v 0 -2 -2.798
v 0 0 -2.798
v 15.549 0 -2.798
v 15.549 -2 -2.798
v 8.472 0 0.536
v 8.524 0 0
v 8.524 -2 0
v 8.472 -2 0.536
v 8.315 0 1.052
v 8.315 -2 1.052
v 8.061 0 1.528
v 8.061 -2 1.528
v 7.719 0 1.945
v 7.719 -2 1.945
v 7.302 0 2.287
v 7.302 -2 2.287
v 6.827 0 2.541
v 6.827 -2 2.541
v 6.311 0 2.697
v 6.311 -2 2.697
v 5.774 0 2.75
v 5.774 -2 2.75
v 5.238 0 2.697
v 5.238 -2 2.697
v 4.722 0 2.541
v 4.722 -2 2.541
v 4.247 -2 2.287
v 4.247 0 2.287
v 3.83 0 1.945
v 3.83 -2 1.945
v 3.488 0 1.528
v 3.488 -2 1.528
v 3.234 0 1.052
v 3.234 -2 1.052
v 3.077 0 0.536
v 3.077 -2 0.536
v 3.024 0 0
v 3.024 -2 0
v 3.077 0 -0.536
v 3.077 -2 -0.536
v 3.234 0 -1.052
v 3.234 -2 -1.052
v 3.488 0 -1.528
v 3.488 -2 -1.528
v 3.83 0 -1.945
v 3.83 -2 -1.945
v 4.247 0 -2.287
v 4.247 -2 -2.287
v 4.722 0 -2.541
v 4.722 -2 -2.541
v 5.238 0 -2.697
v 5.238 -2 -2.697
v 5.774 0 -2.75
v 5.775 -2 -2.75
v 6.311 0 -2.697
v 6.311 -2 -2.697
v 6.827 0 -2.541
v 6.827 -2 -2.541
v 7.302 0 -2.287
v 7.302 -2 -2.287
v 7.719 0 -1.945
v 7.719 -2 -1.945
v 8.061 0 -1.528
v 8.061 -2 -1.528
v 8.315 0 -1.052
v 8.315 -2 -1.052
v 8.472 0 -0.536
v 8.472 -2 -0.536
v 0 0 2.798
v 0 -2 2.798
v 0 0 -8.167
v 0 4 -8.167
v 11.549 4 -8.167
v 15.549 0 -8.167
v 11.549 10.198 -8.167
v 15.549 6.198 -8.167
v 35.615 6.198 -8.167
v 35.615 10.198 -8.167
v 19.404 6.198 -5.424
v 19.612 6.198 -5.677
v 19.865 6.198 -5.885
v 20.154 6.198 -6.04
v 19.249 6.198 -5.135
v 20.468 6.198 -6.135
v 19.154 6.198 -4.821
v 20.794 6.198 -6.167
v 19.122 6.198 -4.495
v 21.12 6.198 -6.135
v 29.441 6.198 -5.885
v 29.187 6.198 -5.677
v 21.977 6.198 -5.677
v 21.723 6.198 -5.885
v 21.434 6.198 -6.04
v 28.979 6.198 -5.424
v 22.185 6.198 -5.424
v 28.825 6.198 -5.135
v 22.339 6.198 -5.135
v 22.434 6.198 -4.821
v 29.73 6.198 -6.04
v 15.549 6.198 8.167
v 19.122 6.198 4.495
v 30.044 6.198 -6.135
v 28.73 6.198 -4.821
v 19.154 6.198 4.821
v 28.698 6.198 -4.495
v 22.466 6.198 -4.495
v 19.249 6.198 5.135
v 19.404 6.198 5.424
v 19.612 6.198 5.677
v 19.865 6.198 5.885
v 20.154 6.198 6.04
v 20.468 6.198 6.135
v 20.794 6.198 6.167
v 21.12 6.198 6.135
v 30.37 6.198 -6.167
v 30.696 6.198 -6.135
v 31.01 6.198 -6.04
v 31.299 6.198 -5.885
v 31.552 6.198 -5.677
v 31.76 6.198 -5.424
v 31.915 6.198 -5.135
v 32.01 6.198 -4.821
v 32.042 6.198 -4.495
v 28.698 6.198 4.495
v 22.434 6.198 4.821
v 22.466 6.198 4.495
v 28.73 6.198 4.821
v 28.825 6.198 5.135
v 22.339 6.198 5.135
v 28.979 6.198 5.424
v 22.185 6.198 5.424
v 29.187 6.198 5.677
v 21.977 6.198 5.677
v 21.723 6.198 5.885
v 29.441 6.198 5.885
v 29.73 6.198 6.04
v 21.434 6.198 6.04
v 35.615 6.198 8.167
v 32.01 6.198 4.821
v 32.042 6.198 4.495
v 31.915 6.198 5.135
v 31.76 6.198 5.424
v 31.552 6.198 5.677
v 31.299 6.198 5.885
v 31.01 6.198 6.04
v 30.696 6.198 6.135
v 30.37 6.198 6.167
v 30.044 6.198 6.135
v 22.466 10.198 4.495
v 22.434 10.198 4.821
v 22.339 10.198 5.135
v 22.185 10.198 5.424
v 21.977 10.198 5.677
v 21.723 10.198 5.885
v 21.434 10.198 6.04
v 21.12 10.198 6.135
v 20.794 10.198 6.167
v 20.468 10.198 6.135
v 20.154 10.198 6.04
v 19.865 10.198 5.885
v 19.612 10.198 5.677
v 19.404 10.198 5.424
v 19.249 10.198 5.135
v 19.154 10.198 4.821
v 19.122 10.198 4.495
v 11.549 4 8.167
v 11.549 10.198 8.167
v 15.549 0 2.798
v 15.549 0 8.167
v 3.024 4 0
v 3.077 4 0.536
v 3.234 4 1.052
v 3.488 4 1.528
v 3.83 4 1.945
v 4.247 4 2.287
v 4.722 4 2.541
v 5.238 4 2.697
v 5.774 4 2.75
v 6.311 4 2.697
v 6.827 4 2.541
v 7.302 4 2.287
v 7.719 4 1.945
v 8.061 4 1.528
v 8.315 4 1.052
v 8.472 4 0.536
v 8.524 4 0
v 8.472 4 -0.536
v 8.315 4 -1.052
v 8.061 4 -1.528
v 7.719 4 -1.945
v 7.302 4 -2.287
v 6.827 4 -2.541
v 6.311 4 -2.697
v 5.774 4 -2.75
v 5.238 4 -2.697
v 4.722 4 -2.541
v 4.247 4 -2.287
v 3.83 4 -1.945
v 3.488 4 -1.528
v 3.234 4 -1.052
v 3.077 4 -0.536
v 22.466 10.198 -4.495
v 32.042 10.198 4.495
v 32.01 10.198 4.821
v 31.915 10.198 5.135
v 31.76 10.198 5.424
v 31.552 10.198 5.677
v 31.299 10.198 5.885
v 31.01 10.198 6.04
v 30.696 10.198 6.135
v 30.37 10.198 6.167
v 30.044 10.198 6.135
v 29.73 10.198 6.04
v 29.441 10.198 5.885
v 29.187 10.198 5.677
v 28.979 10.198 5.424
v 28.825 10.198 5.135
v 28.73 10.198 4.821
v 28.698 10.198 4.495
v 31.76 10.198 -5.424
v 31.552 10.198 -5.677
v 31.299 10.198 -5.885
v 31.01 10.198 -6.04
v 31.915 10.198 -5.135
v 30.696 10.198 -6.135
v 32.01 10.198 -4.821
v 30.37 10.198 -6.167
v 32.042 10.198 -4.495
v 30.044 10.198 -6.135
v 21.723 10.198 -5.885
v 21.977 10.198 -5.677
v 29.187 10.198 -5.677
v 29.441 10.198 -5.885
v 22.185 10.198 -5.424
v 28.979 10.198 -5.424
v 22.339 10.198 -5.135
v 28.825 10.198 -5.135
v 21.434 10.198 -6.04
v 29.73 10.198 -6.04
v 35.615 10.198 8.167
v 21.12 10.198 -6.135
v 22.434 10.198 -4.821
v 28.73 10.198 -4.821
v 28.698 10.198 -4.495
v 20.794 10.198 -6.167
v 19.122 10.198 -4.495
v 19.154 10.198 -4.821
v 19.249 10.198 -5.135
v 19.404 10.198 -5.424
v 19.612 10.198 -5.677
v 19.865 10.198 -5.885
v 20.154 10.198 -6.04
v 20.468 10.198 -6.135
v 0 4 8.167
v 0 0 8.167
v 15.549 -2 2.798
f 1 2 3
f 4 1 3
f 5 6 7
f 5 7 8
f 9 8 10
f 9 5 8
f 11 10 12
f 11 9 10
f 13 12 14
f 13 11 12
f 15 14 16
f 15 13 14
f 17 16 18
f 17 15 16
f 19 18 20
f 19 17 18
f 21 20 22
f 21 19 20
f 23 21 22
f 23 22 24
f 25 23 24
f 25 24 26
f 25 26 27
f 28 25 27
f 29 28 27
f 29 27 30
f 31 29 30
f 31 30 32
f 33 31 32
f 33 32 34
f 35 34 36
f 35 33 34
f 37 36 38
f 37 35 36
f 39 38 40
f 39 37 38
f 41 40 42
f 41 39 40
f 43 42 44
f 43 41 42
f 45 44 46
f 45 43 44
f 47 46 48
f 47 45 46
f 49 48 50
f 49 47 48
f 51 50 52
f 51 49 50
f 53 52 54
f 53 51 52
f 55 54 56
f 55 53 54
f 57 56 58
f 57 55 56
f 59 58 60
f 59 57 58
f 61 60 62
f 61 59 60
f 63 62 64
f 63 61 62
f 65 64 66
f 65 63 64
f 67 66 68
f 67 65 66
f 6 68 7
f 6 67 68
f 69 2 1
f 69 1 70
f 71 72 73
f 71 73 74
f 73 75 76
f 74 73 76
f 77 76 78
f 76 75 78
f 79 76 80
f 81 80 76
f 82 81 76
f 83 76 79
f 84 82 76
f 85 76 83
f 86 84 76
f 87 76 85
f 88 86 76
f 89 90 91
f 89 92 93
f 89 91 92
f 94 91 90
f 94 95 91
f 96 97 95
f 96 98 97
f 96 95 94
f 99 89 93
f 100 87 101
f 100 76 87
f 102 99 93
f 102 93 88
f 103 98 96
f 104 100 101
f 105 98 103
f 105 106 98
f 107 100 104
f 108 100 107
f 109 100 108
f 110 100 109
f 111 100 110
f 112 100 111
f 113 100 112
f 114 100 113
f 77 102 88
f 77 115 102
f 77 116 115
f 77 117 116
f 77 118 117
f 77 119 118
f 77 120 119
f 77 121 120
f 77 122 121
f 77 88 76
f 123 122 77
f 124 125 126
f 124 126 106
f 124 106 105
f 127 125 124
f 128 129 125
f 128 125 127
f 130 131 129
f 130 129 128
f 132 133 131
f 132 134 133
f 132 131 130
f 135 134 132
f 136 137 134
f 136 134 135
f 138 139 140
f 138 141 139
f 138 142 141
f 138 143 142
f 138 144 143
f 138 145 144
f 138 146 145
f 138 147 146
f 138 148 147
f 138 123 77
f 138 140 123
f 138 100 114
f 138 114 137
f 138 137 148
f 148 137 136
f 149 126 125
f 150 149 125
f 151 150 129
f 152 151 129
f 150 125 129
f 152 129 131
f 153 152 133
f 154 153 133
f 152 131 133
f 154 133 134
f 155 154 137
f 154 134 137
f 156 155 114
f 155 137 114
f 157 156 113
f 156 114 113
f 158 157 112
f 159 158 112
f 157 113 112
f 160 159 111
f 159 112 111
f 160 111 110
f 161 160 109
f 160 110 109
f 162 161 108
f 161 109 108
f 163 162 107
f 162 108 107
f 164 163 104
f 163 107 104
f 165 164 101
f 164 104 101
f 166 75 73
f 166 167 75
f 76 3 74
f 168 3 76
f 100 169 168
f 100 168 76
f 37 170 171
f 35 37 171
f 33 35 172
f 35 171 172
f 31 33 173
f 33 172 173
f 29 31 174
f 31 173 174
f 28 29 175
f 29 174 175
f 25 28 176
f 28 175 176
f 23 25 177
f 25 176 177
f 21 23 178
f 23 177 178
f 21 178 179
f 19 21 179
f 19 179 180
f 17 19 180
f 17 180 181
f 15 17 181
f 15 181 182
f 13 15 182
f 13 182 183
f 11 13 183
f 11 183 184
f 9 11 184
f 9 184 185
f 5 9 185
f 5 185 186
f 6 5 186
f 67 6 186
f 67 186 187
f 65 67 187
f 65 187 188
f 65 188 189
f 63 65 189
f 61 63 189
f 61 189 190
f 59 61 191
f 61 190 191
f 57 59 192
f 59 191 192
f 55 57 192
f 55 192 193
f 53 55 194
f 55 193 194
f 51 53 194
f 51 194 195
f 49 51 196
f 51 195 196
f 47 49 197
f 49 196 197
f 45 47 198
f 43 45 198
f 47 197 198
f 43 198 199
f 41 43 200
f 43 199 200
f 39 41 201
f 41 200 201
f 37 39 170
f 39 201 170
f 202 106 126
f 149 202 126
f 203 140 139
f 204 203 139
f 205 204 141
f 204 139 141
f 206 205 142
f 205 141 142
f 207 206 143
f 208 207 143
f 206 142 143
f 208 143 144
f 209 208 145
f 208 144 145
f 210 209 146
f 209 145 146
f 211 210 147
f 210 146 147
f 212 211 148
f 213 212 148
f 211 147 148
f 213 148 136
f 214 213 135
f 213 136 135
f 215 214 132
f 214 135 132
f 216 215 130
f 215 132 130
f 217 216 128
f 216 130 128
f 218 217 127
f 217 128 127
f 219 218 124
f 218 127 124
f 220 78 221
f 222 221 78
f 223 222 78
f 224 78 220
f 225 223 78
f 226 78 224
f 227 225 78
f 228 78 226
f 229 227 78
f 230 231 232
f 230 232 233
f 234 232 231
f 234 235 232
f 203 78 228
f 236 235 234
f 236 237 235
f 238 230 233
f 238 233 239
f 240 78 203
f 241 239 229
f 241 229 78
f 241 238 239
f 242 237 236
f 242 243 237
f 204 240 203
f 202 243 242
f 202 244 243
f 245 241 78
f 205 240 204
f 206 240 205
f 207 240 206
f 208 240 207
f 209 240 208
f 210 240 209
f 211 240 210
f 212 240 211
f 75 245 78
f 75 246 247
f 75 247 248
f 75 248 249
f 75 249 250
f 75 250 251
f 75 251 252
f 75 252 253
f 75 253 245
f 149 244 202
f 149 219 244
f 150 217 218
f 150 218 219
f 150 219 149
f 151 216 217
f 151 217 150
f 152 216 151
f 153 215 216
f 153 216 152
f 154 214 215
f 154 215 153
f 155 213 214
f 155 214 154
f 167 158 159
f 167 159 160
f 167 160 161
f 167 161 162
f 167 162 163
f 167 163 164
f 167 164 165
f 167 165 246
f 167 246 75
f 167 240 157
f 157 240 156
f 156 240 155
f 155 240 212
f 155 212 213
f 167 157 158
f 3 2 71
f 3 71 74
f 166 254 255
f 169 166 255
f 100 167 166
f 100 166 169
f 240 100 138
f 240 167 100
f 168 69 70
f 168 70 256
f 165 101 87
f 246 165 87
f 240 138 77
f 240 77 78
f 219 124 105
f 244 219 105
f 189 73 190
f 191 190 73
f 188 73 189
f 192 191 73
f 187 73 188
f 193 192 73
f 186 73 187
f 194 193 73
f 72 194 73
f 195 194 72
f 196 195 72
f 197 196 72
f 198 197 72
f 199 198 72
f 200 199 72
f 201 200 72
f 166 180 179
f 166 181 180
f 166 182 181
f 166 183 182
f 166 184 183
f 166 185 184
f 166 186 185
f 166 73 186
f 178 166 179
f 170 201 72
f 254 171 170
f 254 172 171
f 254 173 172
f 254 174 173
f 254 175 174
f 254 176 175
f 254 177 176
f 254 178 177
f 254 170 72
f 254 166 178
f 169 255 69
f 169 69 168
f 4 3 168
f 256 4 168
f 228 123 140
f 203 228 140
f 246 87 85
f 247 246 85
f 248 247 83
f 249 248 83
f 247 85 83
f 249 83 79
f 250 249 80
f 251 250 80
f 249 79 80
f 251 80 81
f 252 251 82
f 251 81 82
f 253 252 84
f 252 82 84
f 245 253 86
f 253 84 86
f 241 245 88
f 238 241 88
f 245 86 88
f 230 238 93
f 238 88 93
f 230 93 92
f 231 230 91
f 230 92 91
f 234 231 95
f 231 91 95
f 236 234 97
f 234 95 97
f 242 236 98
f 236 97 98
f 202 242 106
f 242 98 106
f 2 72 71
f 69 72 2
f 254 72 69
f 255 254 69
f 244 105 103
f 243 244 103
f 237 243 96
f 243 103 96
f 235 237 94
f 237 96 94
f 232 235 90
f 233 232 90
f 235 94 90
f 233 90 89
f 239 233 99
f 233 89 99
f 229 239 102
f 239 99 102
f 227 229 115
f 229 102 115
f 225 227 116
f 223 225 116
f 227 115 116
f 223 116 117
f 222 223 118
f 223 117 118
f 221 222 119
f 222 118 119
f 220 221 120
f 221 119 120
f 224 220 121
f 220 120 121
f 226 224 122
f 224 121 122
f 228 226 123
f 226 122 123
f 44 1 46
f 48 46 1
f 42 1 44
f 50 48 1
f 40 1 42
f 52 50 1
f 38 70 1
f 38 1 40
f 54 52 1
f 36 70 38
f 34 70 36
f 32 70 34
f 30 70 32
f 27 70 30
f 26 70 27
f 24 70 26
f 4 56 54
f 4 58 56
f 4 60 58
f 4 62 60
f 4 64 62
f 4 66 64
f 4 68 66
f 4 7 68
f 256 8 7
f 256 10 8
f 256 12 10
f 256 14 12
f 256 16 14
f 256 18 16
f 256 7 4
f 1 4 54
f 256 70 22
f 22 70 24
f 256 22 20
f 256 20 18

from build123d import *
from build123d import SkipClean  # not in build123d's __all__

# Parameters (mm, degrees)
F1_DEPTH = 8.167
F2_R     = 2.75
F3_DEPTH = 4.001
F5_DEPTH = 4.001
F6_W     = 15.549
F6_H     = 5.596
F6_R     = 2.75
F7_DEPTH = 2


with BuildPart() as f1:
    # F0 (on Top) → F1 (new body, symmetric)
    with BuildSketch(Plane.XY):
        Polygon((0, 4), (0, 0), (15.549, 0), (15.549, 6.1976), (35.615, 6.1976), (35.615, 10.1976), (11.549, 10.1976), (11.549, 4), align=None)
    extrude(amount=F1_DEPTH, both=True)

    # F2 (on face) → F3 (cut, through all)
    with BuildSketch(Plane(origin=(0, 4, 0), x_dir=(-1, 0, 0), z_dir=(0, 1, 0))):
        with Locations((-5.7745, 0)):
            Circle(F2_R)
    extrude(amount=-F3_DEPTH, mode=Mode.SUBTRACT)

    # F4 (on face) → F5 (cut, through all)
    with BuildSketch(Plane.XZ.offset(-6.1976)):
        with BuildLine():
            ThreePointArc((22.4665, 4.4946), (20.7941, 6.167), (19.1217, 4.4946))
            Line((19.1217, 4.4946), (19.1217, -4.4946))
            ThreePointArc((19.1217, -4.4946), (20.7941, -6.167), (22.4665, -4.4946))
            Line((22.4665, -4.4946), (22.4665, 4.4946))
        make_face()
        with BuildLine():
            ThreePointArc((32.0423, 4.4946), (30.3699, 6.167), (28.6975, 4.4946))
            Line((28.6975, 4.4946), (28.6975, -4.4946))
            ThreePointArc((28.6975, -4.4946), (30.3699, -6.167), (32.0423, -4.4946))
            Line((32.0423, -4.4946), (32.0423, 4.4946))
        make_face()
    extrude(amount=-F5_DEPTH, mode=Mode.SUBTRACT)

    # F6 (on face) → F7 (join)
    with BuildSketch(Plane.XZ):
        with Locations((7.7745, 0)):
            Rectangle(F6_W, F6_H)
        with Locations((5.7745, 0)):
            Circle(F6_R, mode=Mode.SUBTRACT)
    with SkipClean():  # cleaning this boolean's faces spoils the solid; the shape is the same uncleaned
        extrude(amount=F7_DEPTH)


solid = f1.part
